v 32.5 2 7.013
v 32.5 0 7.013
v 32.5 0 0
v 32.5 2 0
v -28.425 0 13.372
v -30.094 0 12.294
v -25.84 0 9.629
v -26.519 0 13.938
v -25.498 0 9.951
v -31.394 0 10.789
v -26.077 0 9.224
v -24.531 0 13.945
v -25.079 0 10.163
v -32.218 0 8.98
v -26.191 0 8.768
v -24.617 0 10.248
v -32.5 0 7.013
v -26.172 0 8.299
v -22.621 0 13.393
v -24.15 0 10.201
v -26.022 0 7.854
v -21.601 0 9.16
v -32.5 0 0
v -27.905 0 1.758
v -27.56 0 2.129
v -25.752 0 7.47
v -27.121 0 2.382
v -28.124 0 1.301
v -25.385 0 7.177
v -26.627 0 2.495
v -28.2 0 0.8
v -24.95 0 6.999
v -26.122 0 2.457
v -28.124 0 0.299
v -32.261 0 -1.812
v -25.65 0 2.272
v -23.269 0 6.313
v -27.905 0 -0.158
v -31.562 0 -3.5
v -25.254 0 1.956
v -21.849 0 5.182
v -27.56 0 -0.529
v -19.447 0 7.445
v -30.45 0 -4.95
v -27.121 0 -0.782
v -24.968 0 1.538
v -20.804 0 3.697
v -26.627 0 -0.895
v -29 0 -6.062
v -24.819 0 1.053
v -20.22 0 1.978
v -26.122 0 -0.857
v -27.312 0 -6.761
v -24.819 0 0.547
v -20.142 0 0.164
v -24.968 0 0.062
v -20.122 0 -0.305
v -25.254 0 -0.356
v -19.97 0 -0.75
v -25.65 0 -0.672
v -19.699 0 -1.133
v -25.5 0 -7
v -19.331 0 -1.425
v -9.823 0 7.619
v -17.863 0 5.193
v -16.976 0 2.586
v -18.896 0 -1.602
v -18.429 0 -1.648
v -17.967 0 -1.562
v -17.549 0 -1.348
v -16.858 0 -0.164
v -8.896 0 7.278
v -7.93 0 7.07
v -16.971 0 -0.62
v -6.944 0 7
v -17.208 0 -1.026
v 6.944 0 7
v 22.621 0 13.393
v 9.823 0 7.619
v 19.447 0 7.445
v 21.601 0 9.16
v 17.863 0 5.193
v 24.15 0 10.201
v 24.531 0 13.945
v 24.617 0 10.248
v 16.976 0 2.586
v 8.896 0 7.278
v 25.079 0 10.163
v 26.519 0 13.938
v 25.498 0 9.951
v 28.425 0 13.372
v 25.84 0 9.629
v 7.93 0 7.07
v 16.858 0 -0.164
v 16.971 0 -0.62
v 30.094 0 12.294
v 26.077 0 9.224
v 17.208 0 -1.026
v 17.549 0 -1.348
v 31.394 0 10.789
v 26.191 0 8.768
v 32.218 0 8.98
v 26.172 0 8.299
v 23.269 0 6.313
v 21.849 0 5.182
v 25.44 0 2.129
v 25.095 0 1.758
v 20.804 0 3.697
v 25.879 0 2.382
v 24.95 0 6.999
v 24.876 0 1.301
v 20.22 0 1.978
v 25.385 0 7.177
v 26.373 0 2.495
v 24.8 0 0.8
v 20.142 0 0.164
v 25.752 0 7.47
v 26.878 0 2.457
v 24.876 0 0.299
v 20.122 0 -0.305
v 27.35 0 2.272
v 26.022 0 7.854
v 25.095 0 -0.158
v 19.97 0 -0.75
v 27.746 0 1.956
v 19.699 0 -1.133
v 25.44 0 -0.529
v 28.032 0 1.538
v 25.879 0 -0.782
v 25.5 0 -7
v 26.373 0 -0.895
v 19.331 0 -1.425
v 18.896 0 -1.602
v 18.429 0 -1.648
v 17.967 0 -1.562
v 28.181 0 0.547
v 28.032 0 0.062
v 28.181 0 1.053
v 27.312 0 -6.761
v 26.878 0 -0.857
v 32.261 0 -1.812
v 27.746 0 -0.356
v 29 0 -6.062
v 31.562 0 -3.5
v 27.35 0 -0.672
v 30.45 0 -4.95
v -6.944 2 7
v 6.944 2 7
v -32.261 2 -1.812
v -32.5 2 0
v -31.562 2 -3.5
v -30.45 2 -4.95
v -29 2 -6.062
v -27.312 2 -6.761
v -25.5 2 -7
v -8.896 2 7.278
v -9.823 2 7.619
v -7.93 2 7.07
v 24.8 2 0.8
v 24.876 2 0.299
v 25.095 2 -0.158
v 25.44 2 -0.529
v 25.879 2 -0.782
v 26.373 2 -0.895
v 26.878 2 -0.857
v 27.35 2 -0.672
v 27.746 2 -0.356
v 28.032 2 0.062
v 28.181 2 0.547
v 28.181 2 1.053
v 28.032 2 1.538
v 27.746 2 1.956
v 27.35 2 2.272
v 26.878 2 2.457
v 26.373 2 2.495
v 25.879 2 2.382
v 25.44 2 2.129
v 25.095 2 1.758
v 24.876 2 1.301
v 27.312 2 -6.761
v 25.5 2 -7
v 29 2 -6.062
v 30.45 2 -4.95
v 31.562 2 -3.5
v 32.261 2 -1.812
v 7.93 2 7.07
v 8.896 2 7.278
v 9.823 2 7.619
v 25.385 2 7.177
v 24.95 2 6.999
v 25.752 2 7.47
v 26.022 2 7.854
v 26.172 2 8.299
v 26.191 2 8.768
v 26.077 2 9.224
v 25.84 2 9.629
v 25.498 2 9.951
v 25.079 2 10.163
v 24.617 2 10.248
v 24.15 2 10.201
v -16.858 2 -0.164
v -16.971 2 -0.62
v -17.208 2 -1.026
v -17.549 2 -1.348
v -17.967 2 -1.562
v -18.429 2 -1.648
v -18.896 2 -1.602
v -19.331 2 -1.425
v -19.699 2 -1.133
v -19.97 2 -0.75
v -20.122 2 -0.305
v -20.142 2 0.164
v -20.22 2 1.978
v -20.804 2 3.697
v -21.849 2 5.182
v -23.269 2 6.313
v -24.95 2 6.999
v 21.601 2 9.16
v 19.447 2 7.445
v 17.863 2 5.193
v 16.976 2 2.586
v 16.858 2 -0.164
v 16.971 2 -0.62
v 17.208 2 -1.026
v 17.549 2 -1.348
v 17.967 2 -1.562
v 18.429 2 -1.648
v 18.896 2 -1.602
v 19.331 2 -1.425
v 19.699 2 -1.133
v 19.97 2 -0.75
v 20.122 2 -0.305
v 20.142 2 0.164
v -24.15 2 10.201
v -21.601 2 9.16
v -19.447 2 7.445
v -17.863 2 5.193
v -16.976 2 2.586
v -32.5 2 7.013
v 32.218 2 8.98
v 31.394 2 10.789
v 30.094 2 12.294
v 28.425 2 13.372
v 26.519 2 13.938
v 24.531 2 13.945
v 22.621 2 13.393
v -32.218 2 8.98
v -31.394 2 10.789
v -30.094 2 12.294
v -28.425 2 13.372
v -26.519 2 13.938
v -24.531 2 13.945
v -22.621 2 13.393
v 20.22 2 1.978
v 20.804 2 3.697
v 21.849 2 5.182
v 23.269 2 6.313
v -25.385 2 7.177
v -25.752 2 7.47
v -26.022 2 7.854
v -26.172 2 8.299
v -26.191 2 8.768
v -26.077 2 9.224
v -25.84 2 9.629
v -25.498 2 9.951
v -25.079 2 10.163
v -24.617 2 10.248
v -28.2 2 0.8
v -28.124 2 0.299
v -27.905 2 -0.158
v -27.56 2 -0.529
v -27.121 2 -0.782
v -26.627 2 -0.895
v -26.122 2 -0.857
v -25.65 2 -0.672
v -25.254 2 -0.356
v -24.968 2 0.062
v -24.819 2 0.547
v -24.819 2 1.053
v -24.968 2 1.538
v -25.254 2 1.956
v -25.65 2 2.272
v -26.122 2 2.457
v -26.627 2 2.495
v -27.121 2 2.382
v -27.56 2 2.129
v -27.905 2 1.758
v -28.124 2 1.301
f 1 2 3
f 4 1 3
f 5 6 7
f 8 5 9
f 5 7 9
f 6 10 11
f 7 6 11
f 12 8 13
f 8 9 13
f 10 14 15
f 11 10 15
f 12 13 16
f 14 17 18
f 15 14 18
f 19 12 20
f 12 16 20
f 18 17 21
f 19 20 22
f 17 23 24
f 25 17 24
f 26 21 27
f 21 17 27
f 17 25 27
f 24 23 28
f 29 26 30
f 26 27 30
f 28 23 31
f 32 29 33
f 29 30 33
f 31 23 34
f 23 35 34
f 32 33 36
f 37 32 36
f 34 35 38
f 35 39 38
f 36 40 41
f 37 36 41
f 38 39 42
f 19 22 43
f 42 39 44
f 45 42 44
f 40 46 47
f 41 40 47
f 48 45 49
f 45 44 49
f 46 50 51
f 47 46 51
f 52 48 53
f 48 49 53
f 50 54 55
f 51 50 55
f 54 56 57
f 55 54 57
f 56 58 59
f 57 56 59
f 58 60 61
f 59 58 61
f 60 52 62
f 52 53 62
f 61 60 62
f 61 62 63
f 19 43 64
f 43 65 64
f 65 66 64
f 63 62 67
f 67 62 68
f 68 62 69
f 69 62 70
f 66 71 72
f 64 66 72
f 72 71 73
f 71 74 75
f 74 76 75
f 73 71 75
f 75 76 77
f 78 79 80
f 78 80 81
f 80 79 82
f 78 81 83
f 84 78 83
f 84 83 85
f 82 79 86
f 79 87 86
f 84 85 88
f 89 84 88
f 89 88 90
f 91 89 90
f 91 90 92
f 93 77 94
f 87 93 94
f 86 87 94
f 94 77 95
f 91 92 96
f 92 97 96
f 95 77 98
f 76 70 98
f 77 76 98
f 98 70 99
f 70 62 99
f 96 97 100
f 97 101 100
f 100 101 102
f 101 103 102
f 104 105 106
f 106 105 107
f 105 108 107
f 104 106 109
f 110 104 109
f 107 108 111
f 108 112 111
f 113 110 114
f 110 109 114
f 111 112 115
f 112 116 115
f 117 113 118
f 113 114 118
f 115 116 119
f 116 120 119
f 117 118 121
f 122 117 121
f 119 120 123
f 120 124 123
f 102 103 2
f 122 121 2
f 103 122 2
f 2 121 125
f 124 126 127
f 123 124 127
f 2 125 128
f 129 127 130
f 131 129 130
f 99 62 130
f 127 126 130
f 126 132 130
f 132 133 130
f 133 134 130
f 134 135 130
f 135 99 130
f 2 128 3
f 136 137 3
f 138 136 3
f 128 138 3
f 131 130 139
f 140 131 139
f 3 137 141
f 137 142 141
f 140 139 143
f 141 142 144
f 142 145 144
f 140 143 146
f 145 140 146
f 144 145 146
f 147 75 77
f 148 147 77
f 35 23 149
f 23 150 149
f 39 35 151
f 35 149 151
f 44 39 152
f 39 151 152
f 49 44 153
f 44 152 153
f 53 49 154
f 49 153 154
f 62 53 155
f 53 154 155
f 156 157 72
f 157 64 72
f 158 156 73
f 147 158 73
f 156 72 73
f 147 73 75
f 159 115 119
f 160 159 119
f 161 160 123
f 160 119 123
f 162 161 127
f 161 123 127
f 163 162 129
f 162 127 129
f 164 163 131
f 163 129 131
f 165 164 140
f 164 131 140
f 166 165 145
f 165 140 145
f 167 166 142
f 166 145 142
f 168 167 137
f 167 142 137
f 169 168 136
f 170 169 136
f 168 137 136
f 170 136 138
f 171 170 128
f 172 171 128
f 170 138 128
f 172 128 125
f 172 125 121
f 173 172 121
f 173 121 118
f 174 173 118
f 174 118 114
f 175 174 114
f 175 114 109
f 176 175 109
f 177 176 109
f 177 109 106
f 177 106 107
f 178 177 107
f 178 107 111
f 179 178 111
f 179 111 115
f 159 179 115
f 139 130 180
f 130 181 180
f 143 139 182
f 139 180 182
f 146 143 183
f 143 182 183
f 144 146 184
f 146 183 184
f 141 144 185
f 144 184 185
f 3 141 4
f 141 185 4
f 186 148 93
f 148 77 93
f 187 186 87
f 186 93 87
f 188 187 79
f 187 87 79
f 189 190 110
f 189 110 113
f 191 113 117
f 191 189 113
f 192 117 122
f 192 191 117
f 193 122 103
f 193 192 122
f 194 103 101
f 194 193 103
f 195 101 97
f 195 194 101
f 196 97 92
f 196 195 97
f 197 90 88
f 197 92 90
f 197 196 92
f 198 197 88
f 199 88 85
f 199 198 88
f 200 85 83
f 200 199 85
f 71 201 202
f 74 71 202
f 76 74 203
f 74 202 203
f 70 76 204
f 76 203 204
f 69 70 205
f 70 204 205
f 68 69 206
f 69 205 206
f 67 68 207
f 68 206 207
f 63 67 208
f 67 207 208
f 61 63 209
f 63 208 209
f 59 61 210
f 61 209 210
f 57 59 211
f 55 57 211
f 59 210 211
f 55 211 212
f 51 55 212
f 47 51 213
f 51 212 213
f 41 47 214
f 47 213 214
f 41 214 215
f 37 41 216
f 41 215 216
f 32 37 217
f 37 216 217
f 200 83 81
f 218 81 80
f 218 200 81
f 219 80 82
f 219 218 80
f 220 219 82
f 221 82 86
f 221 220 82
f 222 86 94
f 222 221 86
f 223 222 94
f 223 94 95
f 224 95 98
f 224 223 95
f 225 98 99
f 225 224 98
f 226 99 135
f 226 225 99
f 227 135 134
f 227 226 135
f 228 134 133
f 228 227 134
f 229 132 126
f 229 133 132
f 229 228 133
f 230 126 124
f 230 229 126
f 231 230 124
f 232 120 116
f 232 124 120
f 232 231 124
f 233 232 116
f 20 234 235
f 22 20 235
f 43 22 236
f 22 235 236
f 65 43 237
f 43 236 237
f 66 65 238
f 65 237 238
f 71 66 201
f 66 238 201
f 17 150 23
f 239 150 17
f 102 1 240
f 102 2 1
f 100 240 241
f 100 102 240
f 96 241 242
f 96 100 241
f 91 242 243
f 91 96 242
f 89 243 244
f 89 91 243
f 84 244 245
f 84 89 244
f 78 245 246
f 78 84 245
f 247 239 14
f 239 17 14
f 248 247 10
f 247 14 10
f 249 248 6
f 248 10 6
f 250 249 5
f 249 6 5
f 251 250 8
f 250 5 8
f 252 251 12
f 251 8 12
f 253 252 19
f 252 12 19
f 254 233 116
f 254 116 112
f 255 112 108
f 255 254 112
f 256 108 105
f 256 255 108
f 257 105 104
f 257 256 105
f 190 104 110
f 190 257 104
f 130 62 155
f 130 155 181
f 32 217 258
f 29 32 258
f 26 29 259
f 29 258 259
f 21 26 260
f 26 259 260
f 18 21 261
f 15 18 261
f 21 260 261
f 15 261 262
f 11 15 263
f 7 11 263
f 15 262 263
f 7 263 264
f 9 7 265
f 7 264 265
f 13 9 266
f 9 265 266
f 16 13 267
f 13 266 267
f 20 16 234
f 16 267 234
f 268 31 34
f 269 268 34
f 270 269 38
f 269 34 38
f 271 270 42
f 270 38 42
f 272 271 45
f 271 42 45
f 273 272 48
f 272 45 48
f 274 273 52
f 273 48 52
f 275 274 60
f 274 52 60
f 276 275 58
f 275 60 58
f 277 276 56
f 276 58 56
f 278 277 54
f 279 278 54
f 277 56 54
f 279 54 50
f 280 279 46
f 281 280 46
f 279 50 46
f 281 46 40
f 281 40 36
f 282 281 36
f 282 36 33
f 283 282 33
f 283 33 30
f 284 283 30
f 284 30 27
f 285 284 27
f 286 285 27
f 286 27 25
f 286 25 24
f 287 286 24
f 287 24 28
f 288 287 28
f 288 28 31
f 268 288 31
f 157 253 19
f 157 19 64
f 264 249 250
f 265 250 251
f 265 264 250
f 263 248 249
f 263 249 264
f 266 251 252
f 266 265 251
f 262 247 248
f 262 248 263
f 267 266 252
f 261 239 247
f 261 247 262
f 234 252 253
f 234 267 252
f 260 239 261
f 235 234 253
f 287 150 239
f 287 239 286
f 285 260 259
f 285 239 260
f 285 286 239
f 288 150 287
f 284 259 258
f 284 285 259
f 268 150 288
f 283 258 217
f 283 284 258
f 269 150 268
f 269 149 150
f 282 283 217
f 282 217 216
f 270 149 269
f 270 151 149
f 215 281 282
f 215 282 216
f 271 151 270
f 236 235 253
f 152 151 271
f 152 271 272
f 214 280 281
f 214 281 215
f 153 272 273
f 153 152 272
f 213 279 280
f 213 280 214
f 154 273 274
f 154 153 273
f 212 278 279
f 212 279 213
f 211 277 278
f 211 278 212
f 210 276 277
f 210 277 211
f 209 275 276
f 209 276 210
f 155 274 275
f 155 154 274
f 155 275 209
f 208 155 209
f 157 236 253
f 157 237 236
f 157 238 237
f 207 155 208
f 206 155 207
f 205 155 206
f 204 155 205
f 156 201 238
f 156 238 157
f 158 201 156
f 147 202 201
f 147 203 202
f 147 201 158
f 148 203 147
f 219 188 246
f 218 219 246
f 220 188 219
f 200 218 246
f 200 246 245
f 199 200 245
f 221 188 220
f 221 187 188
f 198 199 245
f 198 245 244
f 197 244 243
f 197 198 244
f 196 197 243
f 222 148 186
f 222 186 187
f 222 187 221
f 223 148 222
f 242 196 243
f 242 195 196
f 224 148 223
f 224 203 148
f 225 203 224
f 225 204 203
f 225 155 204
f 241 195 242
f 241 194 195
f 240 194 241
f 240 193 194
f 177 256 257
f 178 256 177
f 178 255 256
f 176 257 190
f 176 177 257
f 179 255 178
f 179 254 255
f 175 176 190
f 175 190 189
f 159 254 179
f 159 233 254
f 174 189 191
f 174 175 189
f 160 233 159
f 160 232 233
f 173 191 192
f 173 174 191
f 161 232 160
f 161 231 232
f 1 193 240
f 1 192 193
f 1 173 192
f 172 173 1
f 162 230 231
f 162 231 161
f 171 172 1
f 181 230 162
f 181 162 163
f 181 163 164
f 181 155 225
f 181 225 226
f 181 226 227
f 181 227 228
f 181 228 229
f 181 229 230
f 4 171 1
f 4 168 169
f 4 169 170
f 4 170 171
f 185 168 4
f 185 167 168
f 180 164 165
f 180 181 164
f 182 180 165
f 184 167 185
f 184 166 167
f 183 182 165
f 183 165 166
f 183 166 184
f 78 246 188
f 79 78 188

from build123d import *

# Parameters (mm, degrees)
SKETCH1_W            = 65
SKETCH1_H            = 14
BOSS_EXTRUDE1_DEPTH  = 2
BOSS_EXTRUDE2_DEPTH  = 2
M3_CLEARANCE_HOLE1_D = 3.4
CUT_EXTRUDE1_DEPTH   = 38.133172501
FILLET1_R            = 7


with BuildPart() as part:
    # Sketch1 → Boss-Extrude1 (new body)
    with BuildSketch(Plane(origin=(0, 0, 0), x_dir=(1, 0, 0), z_dir=(0, 1, 0))):
        Rectangle(SKETCH1_W, SKETCH1_H)
    extrude(amount=BOSS_EXTRUDE1_DEPTH)

    # Sketch5 → Boss-Extrude2 (add)
    with BuildSketch(Plane(origin=(0, 2, 0), x_dir=(1, 0, 0), z_dir=(0, 1, 0))):
        Polygon((-32.5, -7), (-32.5, -17.85), (-8.45, -7), align=None)
        Polygon((8.45, -7), (32.5, -7), (32.5, -17.85), align=None)
    extrude(amount=-BOSS_EXTRUDE2_DEPTH)

    # M3 Clearance Hole1 (through all)
    with Locations(Plane(origin=(0, 2, 0), x_dir=(1, 0, 0), z_dir=(0, 1, 0))):
        with Locations((-26.5, -0.8), (26.5, -0.8)):
            Hole(M3_CLEARANCE_HOLE1_D / 2)

    # Sketch4 → Cut-Extrude1 (cut, through all)
    with BuildSketch(Plane(origin=(0, 2, 0), x_dir=(1, 0, 0), z_dir=(0, 1, 0))):
        with BuildLine():
            ThreePointArc((-24.14980848, -10.200572933), (-18.574782967, -6.375401925), (-16.858188636, 0.164181136))
            ThreePointArc((-16.858188636, 0.164181136), (-18.664181136, 1.641811364), (-20.141811364, -0.164181136))
            ThreePointArc((-20.141811364, -0.164181136), (-21.273800865, -4.476638541), (-24.950191053, -6.999106435))
            ThreePointArc((-24.950191053, -6.999106435), (-26.150733249, -9.000031029), (-24.14980848, -10.200572933))
        make_face()
        with BuildLine():
            ThreePointArc((24.14980848, -10.200572933), (18.574782967, -6.375401925), (16.858188636, 0.164181136))
            ThreePointArc((16.858188636, 0.164181136), (18.664181136, 1.641811364), (20.141811364, -0.164181136))
            ThreePointArc((20.141811364, -0.164181136), (21.273800865, -4.476638541), (24.950191053, -6.999106435))
            ThreePointArc((24.950191053, -6.999106435), (26.150733249, -9.000031029), (24.14980848, -10.200572933))
        make_face()
    extrude(amount=-CUT_EXTRUDE1_DEPTH, mode=Mode.SUBTRACT)

    # Fillet1
    fillet1_edges = [part.edges().sort_by_distance(p)[0] for p in [
        (32.5, 1, -7),
        (-32.5, 1, -7),
        (32.5, 1, 17.85),
        (8.45, 1, 7),
        (-8.45, 1, 7),
        (-32.5, 1, 17.85),
    ]]
    fillet(fillet1_edges, radius=FILLET1_R)


solid = part.part
